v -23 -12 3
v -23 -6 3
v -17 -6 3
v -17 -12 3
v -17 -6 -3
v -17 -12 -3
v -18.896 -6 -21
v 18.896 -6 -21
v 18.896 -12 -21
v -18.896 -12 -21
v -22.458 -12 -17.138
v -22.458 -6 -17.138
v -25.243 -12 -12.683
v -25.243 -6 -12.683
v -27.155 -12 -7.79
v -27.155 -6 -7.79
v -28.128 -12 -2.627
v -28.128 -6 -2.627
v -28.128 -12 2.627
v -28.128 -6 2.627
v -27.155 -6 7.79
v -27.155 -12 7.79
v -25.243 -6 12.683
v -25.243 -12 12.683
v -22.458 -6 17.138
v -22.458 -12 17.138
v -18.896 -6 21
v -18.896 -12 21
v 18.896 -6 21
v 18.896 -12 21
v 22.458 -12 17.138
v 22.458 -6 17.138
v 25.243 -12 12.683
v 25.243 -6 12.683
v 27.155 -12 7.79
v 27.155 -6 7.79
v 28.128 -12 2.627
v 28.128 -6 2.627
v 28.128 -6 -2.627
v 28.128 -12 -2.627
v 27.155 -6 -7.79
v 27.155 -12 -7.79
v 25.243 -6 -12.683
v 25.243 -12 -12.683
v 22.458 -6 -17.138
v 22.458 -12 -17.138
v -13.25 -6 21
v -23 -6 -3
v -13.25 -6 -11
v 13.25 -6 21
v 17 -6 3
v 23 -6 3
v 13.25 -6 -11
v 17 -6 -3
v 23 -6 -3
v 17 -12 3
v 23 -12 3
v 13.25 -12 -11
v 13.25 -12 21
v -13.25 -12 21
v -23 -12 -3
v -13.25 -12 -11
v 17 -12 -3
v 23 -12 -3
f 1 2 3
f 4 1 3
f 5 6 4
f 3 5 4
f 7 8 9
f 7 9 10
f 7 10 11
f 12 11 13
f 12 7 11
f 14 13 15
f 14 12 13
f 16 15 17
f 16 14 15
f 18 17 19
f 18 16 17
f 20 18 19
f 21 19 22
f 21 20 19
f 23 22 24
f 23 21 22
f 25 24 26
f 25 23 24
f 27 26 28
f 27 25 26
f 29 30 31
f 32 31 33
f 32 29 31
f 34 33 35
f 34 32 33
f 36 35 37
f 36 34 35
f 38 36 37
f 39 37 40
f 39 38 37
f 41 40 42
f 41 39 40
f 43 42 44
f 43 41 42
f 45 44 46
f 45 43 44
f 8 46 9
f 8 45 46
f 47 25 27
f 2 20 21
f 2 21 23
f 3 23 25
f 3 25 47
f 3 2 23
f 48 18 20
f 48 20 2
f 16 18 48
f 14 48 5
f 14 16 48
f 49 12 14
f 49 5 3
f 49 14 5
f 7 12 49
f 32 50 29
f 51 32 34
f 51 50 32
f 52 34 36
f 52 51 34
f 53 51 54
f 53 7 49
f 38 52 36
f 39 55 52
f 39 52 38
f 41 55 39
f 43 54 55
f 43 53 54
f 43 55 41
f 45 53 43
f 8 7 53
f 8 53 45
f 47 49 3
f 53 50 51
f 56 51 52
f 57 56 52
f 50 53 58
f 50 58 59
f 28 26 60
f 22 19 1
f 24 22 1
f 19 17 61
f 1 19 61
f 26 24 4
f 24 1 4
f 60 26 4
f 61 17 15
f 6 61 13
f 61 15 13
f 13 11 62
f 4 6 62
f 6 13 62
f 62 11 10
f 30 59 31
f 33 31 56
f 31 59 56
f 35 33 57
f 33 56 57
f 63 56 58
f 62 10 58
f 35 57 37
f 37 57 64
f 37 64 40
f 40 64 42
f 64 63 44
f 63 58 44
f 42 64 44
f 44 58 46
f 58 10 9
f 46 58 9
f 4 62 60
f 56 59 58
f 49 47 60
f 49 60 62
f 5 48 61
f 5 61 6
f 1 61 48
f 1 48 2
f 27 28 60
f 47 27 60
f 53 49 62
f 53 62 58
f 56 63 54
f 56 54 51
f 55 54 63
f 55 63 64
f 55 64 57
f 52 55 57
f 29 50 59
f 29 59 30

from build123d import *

# Parameters (mm, degrees)
SALIENTE_EXTRUIR1_DEPTH = 6
CROQUIS7_R              = 40
SALIENTE_EXTRUIR5_DEPTH = 6
SALIENTE_EXTRUIR3_DEPTH = 6
CROQUIS6_R              = 1.75
SALIENTE_EXTRUIR4_DEPTH = 6
CROQUIS8_W              = 6
CROQUIS8_H              = 6
CORTAR_EXTRUIR1_DEPTH   = 25
CROQUIS9_W              = 322
CROQUIS9_H              = 247
CORTAR_EXTRUIR2_DEPTH   = 12
CROQUIS10_R             = 28.25
CORTAR_EXTRUIR3_DEPTH   = 6


with BuildPart() as part:
    # Croquis1 → Saliente-Extruir1 (new body)
    with BuildSketch(Plane(origin=(0, 0, 0), x_dir=(1, 0, 0), z_dir=(0, 1, 0))):
        with BuildLine():
            Line((-161, 103.5), (-38.791887254, 9.756509788))
            ThreePointArc((-38.791887254, 9.756509788), (-40, 0), (-38.791887254, -9.756509788))
            Line((-38.791887254, -9.756509788), (-161, -103.5))
            Line((-161, -103.5), (-161, -123.5))
            Line((-161, -123.5), (-141, -123.5))
            Line((-141, -123.5), (-22.823766962, -32.84928708))
            ThreePointArc((-22.823766962, -32.84928708), (0, -40), (22.823766962, -32.84928708))
            Line((22.823766962, -32.84928708), (141, -123.5))
            Line((141, -123.5), (161, -123.5))
            Line((161, -123.5), (161, -103.5))
            Line((161, -103.5), (38.791887254, -9.756509788))
            ThreePointArc((38.791887254, -9.756509788), (40, 0), (38.791887254, 9.756509788))
            Line((38.791887254, 9.756509788), (161, 103.5))
            Line((161, 103.5), (161, 123.5))
            Line((161, 123.5), (141, 123.5))
            Line((141, 123.5), (22.823766962, 32.84928708))
            ThreePointArc((22.823766962, 32.84928708), (0, 40), (-22.823766962, 32.84928708))
            Line((-22.823766962, 32.84928708), (-141, 123.5))
            Line((-141, 123.5), (-161, 123.5))
            Line((-161, 123.5), (-161, 103.5))
        make_face()
    extrude(amount=SALIENTE_EXTRUIR1_DEPTH)

    # Croquis7 → Saliente-Extruir5 (add)
    with BuildSketch(Plane(origin=(0, 0, 0), x_dir=(-1, 0, 0), z_dir=(0, -1, 0))):
        Circle(CROQUIS7_R)
    extrude(amount=SALIENTE_EXTRUIR5_DEPTH)

    # Croquis5 → Saliente-Extruir3 (add)
    with BuildSketch(Plane.XZ.offset(6)):
        with BuildLine():
            Line((18.896097481, -21), (-18.896097481, -21))
            ThreePointArc((-18.896097481, -21), (-28.25, 0), (-18.896097481, 21))
            Line((-18.896097481, 21), (-13.25, 21))
            Line((-13.25, 21), (-13.25, -11))
            Line((-13.25, -11), (13.25, -11))
            Line((13.25, -11), (13.25, 21))
            Line((13.25, 21), (18.896097481, 21))
            ThreePointArc((18.896097481, 21), (28.25, 0), (18.896097481, -21))
        make_face()
    extrude(amount=SALIENTE_EXTRUIR3_DEPTH)

    # Croquis6 → Saliente-Extruir4 (add)
    with BuildSketch(Plane.XZ.offset(12)):
        with BuildLine():
            Line((-18.896097481, 21), (-13.25, 21))
            Line((-13.25, 21), (-13.25, 3.5))
            ThreePointArc((-13.25, 3.5), (-13.103553391, 3.146446609), (-12.75, 3))
            Line((-12.75, 3), (12.75, 3))
            ThreePointArc((12.75, 3), (13.103553391, 3.146446609), (13.25, 3.5))
            Line((13.25, 3.5), (13.25, 21))
            Line((13.25, 21), (18.896097481, 21))
            ThreePointArc((18.896097481, 21), (28.25, 0), (18.896097481, -21))
            Line((18.896097481, -21), (-18.896097481, -21))
            ThreePointArc((-18.896097481, -21), (-28.25, 0), (-18.896097481, 21))
        make_face()
        with Locations((-8, -5.75)):
            Circle(CROQUIS6_R, mode=Mode.SUBTRACT)
        with Locations((8, -5.75)):
            Circle(CROQUIS6_R, mode=Mode.SUBTRACT)
    extrude(amount=SALIENTE_EXTRUIR4_DEPTH)

    # Croquis8 → Cortar-Extruir1 (cut, through all)
    with BuildSketch(Plane.XZ.offset(18)):
        with Locations((-20, 0)):
            Rectangle(CROQUIS8_W, CROQUIS8_H)
        with Locations((20, 0)):
            Rectangle(CROQUIS8_W, CROQUIS8_H)
    extrude(amount=-CORTAR_EXTRUIR1_DEPTH, mode=Mode.SUBTRACT)

    # Croquis9 → Cortar-Extruir2 (cut)
    with BuildSketch(Plane(origin=(0, 6, 0), x_dir=(1, 0, 0), z_dir=(0, 1, 0))):
        Rectangle(CROQUIS9_W, CROQUIS9_H)
    extrude(amount=-CORTAR_EXTRUIR2_DEPTH, mode=Mode.SUBTRACT)

    # Croquis10 → Cortar-Extruir3 (cut)
    with BuildSketch(Plane(origin=(0, -18, 0), x_dir=(1, 0, 0), z_dir=(0, 1, 0))):
        Circle(CROQUIS10_R)
    extrude(amount=CORTAR_EXTRUIR3_DEPTH, mode=Mode.SUBTRACT)


solid = part.part
